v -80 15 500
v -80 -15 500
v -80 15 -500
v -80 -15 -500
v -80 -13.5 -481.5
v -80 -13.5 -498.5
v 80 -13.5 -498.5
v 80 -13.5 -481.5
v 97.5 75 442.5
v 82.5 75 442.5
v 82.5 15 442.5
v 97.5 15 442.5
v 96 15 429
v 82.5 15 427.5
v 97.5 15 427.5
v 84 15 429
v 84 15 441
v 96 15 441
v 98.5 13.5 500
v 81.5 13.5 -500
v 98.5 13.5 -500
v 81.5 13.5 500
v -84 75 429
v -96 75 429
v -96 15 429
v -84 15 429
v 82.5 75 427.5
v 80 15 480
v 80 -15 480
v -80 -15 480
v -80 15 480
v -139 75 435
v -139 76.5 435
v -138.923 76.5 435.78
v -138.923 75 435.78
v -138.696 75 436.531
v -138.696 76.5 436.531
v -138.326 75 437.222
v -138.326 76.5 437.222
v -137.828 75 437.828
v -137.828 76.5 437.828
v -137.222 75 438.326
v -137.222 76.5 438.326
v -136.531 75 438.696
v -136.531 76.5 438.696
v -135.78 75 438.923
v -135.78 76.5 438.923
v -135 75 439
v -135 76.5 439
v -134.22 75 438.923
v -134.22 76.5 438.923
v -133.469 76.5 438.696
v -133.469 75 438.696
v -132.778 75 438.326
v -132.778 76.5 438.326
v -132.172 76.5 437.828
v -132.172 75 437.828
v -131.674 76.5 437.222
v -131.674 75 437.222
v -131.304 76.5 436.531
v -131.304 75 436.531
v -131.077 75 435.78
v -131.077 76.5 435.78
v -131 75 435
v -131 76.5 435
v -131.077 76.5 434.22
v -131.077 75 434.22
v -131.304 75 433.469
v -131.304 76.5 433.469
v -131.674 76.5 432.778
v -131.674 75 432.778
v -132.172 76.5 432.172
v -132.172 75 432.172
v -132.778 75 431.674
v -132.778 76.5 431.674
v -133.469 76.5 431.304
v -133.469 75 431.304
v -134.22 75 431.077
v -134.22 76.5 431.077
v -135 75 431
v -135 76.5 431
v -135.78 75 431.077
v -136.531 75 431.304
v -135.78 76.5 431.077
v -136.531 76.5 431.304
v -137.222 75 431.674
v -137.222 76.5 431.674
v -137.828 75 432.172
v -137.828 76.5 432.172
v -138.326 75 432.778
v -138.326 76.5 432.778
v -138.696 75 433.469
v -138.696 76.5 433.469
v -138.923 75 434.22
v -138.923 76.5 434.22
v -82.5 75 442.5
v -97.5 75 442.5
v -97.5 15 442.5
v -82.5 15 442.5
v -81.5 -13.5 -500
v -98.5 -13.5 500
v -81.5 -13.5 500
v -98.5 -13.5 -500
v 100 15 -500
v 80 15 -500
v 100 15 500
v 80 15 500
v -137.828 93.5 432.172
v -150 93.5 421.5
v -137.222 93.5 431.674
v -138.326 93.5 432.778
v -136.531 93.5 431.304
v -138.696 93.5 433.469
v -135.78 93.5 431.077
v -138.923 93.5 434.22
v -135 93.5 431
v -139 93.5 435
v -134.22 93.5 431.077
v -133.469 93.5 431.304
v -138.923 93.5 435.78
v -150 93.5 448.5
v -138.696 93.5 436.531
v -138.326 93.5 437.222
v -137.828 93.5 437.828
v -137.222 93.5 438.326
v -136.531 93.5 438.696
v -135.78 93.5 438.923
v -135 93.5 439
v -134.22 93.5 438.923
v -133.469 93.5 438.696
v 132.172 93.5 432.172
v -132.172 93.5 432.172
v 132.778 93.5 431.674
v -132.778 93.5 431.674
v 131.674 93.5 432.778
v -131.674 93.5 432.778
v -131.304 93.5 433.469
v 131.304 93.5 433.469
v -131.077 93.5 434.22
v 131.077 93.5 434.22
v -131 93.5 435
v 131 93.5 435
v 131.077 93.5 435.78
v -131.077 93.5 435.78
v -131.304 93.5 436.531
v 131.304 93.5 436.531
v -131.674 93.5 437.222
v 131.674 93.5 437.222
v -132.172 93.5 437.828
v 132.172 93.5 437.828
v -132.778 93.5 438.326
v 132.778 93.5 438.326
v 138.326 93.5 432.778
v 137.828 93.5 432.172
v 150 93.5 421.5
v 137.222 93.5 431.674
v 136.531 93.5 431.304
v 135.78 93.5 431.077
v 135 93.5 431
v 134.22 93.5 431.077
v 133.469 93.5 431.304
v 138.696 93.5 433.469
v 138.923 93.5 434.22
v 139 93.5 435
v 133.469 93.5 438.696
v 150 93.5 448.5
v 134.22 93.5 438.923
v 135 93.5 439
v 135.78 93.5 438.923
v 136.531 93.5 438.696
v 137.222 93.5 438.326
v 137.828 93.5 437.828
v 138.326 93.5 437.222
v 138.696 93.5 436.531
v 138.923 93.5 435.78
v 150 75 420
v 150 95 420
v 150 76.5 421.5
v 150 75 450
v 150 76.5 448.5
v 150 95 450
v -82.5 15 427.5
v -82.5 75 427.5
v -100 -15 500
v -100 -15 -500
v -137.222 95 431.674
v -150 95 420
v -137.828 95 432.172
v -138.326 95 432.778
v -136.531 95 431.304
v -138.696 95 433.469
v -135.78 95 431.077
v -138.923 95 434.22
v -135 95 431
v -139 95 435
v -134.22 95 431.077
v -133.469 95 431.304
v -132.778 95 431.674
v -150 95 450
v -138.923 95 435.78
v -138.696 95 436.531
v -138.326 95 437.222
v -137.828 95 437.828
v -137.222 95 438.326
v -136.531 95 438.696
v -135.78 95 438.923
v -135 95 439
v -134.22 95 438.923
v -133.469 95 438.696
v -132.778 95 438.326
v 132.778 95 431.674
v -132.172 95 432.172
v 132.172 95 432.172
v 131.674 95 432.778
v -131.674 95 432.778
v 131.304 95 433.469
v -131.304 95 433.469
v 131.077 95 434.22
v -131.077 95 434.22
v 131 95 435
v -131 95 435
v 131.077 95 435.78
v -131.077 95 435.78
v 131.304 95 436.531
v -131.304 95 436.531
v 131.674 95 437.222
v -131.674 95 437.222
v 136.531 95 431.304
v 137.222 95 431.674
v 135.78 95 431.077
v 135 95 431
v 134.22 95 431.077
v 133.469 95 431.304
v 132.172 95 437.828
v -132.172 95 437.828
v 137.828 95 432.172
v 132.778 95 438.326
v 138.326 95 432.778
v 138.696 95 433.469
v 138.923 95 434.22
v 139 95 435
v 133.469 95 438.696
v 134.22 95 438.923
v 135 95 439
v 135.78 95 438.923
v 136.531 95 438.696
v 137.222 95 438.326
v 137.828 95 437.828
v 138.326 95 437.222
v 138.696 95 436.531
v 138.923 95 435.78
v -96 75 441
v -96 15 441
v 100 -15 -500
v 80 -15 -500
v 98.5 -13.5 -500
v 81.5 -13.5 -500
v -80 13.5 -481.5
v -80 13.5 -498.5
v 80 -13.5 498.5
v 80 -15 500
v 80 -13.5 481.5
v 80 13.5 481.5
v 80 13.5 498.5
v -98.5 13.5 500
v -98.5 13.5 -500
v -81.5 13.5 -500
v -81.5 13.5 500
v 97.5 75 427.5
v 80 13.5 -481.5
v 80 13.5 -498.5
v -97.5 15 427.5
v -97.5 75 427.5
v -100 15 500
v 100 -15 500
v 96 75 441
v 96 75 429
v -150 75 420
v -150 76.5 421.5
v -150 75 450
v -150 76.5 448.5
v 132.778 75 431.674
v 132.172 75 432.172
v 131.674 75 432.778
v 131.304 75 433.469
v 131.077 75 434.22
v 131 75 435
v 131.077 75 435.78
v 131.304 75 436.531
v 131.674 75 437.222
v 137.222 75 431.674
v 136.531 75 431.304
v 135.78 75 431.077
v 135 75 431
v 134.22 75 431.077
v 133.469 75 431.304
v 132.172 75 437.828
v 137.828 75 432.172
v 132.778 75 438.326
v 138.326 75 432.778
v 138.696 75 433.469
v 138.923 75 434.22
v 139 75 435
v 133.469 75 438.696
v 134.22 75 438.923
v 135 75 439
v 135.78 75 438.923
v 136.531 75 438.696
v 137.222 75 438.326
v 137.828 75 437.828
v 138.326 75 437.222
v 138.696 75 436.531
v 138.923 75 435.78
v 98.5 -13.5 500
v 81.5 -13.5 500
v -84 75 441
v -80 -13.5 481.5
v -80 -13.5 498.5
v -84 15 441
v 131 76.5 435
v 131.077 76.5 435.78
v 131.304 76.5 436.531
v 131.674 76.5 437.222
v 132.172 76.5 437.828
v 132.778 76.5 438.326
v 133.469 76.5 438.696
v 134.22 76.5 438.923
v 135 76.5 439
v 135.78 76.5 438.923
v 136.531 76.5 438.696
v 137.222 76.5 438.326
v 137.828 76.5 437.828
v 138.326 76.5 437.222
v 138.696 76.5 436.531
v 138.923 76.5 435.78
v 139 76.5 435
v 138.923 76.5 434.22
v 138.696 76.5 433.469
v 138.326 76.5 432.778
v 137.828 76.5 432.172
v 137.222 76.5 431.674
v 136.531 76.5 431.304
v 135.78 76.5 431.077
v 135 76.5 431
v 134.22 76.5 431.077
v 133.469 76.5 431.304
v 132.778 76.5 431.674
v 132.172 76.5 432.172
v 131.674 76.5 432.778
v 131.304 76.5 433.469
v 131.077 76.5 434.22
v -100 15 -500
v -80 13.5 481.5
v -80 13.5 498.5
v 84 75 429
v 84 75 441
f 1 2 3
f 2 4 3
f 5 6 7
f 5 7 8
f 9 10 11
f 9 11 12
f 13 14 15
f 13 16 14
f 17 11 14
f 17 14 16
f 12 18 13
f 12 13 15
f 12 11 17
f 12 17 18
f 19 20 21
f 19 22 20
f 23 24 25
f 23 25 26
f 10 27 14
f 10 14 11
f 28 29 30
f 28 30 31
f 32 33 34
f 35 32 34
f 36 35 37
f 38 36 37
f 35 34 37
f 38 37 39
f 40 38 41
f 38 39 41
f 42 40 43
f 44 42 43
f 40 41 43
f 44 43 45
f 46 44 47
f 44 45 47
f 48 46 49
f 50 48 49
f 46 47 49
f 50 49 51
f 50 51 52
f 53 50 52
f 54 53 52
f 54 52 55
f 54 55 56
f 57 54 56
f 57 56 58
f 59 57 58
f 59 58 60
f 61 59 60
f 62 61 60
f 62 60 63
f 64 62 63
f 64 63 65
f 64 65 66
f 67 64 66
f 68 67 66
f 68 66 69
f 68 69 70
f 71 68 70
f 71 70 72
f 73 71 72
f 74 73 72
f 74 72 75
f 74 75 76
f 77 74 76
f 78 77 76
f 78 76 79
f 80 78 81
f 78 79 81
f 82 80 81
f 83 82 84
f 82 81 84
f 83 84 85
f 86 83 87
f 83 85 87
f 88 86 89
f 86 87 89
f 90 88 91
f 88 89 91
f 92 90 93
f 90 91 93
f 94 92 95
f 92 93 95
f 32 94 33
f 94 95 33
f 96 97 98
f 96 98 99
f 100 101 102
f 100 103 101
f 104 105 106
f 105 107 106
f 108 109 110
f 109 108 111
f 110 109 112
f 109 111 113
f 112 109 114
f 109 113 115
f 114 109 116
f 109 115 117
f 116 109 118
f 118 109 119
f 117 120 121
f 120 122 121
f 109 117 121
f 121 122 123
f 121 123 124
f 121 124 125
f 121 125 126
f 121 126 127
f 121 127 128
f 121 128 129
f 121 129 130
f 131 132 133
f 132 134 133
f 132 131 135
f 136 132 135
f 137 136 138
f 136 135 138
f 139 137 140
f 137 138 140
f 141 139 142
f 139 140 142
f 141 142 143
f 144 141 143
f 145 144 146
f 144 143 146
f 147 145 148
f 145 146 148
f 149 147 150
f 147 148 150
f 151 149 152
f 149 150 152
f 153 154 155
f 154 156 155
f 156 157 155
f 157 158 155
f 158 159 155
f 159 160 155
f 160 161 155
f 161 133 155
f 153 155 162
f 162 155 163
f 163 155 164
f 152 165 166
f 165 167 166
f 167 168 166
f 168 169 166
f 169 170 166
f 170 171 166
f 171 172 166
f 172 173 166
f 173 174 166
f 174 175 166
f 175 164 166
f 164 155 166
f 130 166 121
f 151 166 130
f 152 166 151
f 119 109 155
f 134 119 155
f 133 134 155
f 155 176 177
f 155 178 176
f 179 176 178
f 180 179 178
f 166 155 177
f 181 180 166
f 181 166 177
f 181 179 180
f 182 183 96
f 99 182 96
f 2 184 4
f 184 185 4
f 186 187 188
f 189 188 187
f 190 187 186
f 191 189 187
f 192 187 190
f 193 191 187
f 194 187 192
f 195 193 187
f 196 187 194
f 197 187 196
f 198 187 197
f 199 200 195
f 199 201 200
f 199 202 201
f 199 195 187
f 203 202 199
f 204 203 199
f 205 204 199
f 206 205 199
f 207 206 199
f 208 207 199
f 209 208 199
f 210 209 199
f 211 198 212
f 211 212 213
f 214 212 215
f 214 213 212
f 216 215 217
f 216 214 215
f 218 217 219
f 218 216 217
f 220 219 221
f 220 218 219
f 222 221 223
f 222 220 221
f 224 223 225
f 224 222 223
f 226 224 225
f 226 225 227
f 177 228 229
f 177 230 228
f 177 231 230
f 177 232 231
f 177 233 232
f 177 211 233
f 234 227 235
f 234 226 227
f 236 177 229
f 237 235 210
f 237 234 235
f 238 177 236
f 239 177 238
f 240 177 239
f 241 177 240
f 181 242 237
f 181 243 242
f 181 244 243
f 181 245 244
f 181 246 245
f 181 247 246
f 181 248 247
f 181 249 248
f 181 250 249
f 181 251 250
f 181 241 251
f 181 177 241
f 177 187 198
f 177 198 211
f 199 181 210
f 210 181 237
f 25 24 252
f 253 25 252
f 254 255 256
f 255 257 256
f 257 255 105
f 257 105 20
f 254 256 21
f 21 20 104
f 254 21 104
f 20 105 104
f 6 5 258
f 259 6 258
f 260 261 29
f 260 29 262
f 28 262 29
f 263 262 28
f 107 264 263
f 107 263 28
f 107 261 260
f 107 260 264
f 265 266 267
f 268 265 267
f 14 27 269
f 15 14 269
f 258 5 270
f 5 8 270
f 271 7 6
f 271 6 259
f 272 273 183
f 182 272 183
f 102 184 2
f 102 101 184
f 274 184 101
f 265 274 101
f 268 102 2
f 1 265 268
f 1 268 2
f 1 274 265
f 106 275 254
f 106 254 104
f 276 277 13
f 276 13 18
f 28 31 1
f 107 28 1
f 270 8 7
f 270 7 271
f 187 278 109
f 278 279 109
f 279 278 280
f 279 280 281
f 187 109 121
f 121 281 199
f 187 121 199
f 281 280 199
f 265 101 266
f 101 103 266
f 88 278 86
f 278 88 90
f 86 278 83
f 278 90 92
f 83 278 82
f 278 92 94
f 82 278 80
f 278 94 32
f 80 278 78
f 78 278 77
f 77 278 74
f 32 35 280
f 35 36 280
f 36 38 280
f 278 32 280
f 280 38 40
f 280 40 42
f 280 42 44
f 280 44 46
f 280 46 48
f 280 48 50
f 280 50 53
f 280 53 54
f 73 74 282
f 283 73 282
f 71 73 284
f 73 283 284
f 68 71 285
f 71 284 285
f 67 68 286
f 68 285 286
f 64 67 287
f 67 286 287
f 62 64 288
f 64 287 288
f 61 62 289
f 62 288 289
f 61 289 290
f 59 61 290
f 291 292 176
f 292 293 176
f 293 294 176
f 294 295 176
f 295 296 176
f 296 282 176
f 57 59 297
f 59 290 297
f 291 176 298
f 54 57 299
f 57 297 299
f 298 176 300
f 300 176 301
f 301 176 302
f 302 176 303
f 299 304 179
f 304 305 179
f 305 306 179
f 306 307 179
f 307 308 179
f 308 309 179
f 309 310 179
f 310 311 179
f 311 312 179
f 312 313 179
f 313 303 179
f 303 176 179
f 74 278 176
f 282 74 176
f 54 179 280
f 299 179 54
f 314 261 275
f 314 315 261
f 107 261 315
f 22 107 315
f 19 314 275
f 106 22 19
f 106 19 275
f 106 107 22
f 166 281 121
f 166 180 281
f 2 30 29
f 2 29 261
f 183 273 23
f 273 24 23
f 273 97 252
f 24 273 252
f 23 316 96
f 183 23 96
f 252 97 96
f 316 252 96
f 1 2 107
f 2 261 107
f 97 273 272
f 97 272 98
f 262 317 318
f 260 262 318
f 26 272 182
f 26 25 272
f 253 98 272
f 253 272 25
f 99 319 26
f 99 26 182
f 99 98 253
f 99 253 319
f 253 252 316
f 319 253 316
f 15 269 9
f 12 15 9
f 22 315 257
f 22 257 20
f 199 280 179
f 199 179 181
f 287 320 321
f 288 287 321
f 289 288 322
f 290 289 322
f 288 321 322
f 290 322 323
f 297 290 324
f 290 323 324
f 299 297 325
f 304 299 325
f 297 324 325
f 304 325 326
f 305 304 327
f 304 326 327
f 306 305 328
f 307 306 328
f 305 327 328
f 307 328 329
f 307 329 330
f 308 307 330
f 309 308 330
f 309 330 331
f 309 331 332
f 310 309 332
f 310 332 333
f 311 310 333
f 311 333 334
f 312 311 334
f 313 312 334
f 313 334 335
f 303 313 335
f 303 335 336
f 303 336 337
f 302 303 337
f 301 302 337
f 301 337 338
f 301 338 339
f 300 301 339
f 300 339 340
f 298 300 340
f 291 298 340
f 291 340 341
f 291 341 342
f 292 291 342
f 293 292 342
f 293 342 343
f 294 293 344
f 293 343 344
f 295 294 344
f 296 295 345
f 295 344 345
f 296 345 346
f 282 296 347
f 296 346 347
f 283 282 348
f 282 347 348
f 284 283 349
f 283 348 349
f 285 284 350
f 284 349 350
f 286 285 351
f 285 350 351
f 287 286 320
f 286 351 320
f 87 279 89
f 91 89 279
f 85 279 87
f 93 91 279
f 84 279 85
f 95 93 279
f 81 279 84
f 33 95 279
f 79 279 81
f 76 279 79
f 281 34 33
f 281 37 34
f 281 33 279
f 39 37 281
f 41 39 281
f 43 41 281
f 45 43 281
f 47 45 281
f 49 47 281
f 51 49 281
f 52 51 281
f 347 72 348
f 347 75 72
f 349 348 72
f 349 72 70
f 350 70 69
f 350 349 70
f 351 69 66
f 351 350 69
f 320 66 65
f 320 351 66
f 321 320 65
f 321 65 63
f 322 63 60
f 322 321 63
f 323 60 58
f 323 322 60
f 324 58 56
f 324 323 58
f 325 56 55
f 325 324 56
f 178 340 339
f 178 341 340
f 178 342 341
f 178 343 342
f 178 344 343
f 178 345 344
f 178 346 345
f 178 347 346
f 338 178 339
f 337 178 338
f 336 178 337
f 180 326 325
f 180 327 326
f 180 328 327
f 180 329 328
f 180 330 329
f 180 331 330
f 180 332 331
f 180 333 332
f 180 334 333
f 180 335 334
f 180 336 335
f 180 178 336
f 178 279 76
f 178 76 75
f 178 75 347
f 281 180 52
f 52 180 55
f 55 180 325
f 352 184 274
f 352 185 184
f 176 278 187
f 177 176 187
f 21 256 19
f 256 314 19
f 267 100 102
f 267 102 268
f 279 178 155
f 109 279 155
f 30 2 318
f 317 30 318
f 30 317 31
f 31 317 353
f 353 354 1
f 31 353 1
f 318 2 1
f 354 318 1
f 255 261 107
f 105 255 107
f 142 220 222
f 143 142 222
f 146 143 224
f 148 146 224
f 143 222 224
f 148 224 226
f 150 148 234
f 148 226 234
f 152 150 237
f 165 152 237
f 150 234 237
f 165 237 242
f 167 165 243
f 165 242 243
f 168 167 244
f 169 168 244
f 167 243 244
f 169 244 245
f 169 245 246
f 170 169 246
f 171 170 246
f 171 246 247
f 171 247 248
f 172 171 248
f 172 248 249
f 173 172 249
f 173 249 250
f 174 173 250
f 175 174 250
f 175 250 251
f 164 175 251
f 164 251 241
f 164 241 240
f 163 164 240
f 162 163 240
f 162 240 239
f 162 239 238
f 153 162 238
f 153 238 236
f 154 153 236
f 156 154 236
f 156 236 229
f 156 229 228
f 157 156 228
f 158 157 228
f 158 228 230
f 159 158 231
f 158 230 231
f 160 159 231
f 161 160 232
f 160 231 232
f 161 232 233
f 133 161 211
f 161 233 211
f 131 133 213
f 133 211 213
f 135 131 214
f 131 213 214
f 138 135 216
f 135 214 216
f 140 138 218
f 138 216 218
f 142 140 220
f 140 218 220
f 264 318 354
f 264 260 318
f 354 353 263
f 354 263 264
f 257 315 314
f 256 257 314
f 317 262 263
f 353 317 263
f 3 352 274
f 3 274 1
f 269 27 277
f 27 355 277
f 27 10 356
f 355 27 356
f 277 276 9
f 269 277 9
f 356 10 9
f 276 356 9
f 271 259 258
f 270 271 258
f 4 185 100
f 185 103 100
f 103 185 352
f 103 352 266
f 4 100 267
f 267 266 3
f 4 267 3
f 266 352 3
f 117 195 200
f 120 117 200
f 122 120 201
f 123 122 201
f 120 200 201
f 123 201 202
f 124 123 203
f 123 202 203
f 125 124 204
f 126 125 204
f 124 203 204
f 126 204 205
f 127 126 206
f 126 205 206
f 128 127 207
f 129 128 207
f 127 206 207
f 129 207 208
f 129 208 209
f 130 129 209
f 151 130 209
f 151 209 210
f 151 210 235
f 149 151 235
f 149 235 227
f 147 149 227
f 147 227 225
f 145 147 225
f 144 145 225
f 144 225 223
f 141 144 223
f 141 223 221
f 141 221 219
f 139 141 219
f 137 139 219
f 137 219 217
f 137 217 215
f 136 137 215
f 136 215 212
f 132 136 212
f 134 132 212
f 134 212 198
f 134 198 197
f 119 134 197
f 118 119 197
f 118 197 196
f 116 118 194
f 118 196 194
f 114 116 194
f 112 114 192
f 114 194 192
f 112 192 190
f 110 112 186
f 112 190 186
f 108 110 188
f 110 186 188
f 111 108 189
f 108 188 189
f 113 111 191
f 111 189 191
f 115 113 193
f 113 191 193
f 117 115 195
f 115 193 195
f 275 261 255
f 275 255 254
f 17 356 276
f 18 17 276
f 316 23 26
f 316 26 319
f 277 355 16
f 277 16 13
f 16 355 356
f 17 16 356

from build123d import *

# Parameters (mm, degrees)
F0_W          = 20
F0_H          = 30
F0_W_2        = 17
F0_H_2        = 27
F1_DEPTH      = 500
F2_W          = 30
F2_H          = 20
F2_W_2        = 27
F2_H_2        = 17
F3_DEPTH      = 80
F3_DEPTH_BACK = 80
F4_W          = 20
F4_H          = 30
F4_W_2        = 17
F4_H_2        = 27
F5_DEPTH      = 150
F6_W          = 15
F6_H          = 15
F6_W_2        = 12
F6_H_2        = 12
F7_DEPTH      = 60
F9_D          = 8


with BuildPart() as f1:
    # F0 (on Top) → F1 (new body, symmetric)
    with BuildSketch(Plane.XY):
        with Locations((-90, 0)):
            Rectangle(F0_W, F0_H)
        with Locations((-90, 0)):
            Rectangle(F0_W_2, F0_H_2, mode=Mode.SUBTRACT)
        with Locations((90, 0)):
            Rectangle(F0_W, F0_H)
        with Locations((90, 0)):
            Rectangle(F0_W_2, F0_H_2, mode=Mode.SUBTRACT)
    extrude(amount=F1_DEPTH, both=True)


with BuildPart() as f3:
    # F2 (on Right) → F3 (new body, two sides)
    with BuildSketch(Plane.YZ) as f3_sk:
        with Locations((0, 490)):
            Rectangle(F2_W, F2_H)
        with Locations((0, 490)):
            Rectangle(F2_W_2, F2_H_2, mode=Mode.SUBTRACT)
        with Locations((0, -490)):
            Rectangle(F2_W_2, F2_H_2)
    extrude(amount=F3_DEPTH)
    extrude(f3_sk.sketch, amount=-F3_DEPTH_BACK)


with BuildPart() as f5:
    # F4 (on Right) → F5 (new body, symmetric)
    with BuildSketch(Plane.YZ):
        with Locations((85, 435)):
            Rectangle(F4_W, F4_H)
        with Locations((85, 435)):
            Rectangle(F4_W_2, F4_H_2, mode=Mode.SUBTRACT)
    extrude(amount=F5_DEPTH, both=True)

    # F9 (through all)
    with Locations(Plane.XZ.offset(-75)):
        with Locations((135, 435), (-135, 435)):
            Hole(F9_D / 2)


with BuildPart() as f7:
    # F6 (on face) → F7 (new body, through all)
    with BuildSketch(Plane.XZ.offset(-75)):
        with Locations((90, 435)):
            Rectangle(F6_W, F6_H)
        with Locations((90, 435)):
            Rectangle(F6_W_2, F6_H_2, mode=Mode.SUBTRACT)
        with Locations((-90, 435)):
            Rectangle(F6_W, F6_H)
        with Locations((-90, 435)):
            Rectangle(F6_W_2, F6_H_2, mode=Mode.SUBTRACT)
    extrude(amount=F7_DEPTH)


solid = Compound([f1.part, f3.part, f5.part, f7.part])
